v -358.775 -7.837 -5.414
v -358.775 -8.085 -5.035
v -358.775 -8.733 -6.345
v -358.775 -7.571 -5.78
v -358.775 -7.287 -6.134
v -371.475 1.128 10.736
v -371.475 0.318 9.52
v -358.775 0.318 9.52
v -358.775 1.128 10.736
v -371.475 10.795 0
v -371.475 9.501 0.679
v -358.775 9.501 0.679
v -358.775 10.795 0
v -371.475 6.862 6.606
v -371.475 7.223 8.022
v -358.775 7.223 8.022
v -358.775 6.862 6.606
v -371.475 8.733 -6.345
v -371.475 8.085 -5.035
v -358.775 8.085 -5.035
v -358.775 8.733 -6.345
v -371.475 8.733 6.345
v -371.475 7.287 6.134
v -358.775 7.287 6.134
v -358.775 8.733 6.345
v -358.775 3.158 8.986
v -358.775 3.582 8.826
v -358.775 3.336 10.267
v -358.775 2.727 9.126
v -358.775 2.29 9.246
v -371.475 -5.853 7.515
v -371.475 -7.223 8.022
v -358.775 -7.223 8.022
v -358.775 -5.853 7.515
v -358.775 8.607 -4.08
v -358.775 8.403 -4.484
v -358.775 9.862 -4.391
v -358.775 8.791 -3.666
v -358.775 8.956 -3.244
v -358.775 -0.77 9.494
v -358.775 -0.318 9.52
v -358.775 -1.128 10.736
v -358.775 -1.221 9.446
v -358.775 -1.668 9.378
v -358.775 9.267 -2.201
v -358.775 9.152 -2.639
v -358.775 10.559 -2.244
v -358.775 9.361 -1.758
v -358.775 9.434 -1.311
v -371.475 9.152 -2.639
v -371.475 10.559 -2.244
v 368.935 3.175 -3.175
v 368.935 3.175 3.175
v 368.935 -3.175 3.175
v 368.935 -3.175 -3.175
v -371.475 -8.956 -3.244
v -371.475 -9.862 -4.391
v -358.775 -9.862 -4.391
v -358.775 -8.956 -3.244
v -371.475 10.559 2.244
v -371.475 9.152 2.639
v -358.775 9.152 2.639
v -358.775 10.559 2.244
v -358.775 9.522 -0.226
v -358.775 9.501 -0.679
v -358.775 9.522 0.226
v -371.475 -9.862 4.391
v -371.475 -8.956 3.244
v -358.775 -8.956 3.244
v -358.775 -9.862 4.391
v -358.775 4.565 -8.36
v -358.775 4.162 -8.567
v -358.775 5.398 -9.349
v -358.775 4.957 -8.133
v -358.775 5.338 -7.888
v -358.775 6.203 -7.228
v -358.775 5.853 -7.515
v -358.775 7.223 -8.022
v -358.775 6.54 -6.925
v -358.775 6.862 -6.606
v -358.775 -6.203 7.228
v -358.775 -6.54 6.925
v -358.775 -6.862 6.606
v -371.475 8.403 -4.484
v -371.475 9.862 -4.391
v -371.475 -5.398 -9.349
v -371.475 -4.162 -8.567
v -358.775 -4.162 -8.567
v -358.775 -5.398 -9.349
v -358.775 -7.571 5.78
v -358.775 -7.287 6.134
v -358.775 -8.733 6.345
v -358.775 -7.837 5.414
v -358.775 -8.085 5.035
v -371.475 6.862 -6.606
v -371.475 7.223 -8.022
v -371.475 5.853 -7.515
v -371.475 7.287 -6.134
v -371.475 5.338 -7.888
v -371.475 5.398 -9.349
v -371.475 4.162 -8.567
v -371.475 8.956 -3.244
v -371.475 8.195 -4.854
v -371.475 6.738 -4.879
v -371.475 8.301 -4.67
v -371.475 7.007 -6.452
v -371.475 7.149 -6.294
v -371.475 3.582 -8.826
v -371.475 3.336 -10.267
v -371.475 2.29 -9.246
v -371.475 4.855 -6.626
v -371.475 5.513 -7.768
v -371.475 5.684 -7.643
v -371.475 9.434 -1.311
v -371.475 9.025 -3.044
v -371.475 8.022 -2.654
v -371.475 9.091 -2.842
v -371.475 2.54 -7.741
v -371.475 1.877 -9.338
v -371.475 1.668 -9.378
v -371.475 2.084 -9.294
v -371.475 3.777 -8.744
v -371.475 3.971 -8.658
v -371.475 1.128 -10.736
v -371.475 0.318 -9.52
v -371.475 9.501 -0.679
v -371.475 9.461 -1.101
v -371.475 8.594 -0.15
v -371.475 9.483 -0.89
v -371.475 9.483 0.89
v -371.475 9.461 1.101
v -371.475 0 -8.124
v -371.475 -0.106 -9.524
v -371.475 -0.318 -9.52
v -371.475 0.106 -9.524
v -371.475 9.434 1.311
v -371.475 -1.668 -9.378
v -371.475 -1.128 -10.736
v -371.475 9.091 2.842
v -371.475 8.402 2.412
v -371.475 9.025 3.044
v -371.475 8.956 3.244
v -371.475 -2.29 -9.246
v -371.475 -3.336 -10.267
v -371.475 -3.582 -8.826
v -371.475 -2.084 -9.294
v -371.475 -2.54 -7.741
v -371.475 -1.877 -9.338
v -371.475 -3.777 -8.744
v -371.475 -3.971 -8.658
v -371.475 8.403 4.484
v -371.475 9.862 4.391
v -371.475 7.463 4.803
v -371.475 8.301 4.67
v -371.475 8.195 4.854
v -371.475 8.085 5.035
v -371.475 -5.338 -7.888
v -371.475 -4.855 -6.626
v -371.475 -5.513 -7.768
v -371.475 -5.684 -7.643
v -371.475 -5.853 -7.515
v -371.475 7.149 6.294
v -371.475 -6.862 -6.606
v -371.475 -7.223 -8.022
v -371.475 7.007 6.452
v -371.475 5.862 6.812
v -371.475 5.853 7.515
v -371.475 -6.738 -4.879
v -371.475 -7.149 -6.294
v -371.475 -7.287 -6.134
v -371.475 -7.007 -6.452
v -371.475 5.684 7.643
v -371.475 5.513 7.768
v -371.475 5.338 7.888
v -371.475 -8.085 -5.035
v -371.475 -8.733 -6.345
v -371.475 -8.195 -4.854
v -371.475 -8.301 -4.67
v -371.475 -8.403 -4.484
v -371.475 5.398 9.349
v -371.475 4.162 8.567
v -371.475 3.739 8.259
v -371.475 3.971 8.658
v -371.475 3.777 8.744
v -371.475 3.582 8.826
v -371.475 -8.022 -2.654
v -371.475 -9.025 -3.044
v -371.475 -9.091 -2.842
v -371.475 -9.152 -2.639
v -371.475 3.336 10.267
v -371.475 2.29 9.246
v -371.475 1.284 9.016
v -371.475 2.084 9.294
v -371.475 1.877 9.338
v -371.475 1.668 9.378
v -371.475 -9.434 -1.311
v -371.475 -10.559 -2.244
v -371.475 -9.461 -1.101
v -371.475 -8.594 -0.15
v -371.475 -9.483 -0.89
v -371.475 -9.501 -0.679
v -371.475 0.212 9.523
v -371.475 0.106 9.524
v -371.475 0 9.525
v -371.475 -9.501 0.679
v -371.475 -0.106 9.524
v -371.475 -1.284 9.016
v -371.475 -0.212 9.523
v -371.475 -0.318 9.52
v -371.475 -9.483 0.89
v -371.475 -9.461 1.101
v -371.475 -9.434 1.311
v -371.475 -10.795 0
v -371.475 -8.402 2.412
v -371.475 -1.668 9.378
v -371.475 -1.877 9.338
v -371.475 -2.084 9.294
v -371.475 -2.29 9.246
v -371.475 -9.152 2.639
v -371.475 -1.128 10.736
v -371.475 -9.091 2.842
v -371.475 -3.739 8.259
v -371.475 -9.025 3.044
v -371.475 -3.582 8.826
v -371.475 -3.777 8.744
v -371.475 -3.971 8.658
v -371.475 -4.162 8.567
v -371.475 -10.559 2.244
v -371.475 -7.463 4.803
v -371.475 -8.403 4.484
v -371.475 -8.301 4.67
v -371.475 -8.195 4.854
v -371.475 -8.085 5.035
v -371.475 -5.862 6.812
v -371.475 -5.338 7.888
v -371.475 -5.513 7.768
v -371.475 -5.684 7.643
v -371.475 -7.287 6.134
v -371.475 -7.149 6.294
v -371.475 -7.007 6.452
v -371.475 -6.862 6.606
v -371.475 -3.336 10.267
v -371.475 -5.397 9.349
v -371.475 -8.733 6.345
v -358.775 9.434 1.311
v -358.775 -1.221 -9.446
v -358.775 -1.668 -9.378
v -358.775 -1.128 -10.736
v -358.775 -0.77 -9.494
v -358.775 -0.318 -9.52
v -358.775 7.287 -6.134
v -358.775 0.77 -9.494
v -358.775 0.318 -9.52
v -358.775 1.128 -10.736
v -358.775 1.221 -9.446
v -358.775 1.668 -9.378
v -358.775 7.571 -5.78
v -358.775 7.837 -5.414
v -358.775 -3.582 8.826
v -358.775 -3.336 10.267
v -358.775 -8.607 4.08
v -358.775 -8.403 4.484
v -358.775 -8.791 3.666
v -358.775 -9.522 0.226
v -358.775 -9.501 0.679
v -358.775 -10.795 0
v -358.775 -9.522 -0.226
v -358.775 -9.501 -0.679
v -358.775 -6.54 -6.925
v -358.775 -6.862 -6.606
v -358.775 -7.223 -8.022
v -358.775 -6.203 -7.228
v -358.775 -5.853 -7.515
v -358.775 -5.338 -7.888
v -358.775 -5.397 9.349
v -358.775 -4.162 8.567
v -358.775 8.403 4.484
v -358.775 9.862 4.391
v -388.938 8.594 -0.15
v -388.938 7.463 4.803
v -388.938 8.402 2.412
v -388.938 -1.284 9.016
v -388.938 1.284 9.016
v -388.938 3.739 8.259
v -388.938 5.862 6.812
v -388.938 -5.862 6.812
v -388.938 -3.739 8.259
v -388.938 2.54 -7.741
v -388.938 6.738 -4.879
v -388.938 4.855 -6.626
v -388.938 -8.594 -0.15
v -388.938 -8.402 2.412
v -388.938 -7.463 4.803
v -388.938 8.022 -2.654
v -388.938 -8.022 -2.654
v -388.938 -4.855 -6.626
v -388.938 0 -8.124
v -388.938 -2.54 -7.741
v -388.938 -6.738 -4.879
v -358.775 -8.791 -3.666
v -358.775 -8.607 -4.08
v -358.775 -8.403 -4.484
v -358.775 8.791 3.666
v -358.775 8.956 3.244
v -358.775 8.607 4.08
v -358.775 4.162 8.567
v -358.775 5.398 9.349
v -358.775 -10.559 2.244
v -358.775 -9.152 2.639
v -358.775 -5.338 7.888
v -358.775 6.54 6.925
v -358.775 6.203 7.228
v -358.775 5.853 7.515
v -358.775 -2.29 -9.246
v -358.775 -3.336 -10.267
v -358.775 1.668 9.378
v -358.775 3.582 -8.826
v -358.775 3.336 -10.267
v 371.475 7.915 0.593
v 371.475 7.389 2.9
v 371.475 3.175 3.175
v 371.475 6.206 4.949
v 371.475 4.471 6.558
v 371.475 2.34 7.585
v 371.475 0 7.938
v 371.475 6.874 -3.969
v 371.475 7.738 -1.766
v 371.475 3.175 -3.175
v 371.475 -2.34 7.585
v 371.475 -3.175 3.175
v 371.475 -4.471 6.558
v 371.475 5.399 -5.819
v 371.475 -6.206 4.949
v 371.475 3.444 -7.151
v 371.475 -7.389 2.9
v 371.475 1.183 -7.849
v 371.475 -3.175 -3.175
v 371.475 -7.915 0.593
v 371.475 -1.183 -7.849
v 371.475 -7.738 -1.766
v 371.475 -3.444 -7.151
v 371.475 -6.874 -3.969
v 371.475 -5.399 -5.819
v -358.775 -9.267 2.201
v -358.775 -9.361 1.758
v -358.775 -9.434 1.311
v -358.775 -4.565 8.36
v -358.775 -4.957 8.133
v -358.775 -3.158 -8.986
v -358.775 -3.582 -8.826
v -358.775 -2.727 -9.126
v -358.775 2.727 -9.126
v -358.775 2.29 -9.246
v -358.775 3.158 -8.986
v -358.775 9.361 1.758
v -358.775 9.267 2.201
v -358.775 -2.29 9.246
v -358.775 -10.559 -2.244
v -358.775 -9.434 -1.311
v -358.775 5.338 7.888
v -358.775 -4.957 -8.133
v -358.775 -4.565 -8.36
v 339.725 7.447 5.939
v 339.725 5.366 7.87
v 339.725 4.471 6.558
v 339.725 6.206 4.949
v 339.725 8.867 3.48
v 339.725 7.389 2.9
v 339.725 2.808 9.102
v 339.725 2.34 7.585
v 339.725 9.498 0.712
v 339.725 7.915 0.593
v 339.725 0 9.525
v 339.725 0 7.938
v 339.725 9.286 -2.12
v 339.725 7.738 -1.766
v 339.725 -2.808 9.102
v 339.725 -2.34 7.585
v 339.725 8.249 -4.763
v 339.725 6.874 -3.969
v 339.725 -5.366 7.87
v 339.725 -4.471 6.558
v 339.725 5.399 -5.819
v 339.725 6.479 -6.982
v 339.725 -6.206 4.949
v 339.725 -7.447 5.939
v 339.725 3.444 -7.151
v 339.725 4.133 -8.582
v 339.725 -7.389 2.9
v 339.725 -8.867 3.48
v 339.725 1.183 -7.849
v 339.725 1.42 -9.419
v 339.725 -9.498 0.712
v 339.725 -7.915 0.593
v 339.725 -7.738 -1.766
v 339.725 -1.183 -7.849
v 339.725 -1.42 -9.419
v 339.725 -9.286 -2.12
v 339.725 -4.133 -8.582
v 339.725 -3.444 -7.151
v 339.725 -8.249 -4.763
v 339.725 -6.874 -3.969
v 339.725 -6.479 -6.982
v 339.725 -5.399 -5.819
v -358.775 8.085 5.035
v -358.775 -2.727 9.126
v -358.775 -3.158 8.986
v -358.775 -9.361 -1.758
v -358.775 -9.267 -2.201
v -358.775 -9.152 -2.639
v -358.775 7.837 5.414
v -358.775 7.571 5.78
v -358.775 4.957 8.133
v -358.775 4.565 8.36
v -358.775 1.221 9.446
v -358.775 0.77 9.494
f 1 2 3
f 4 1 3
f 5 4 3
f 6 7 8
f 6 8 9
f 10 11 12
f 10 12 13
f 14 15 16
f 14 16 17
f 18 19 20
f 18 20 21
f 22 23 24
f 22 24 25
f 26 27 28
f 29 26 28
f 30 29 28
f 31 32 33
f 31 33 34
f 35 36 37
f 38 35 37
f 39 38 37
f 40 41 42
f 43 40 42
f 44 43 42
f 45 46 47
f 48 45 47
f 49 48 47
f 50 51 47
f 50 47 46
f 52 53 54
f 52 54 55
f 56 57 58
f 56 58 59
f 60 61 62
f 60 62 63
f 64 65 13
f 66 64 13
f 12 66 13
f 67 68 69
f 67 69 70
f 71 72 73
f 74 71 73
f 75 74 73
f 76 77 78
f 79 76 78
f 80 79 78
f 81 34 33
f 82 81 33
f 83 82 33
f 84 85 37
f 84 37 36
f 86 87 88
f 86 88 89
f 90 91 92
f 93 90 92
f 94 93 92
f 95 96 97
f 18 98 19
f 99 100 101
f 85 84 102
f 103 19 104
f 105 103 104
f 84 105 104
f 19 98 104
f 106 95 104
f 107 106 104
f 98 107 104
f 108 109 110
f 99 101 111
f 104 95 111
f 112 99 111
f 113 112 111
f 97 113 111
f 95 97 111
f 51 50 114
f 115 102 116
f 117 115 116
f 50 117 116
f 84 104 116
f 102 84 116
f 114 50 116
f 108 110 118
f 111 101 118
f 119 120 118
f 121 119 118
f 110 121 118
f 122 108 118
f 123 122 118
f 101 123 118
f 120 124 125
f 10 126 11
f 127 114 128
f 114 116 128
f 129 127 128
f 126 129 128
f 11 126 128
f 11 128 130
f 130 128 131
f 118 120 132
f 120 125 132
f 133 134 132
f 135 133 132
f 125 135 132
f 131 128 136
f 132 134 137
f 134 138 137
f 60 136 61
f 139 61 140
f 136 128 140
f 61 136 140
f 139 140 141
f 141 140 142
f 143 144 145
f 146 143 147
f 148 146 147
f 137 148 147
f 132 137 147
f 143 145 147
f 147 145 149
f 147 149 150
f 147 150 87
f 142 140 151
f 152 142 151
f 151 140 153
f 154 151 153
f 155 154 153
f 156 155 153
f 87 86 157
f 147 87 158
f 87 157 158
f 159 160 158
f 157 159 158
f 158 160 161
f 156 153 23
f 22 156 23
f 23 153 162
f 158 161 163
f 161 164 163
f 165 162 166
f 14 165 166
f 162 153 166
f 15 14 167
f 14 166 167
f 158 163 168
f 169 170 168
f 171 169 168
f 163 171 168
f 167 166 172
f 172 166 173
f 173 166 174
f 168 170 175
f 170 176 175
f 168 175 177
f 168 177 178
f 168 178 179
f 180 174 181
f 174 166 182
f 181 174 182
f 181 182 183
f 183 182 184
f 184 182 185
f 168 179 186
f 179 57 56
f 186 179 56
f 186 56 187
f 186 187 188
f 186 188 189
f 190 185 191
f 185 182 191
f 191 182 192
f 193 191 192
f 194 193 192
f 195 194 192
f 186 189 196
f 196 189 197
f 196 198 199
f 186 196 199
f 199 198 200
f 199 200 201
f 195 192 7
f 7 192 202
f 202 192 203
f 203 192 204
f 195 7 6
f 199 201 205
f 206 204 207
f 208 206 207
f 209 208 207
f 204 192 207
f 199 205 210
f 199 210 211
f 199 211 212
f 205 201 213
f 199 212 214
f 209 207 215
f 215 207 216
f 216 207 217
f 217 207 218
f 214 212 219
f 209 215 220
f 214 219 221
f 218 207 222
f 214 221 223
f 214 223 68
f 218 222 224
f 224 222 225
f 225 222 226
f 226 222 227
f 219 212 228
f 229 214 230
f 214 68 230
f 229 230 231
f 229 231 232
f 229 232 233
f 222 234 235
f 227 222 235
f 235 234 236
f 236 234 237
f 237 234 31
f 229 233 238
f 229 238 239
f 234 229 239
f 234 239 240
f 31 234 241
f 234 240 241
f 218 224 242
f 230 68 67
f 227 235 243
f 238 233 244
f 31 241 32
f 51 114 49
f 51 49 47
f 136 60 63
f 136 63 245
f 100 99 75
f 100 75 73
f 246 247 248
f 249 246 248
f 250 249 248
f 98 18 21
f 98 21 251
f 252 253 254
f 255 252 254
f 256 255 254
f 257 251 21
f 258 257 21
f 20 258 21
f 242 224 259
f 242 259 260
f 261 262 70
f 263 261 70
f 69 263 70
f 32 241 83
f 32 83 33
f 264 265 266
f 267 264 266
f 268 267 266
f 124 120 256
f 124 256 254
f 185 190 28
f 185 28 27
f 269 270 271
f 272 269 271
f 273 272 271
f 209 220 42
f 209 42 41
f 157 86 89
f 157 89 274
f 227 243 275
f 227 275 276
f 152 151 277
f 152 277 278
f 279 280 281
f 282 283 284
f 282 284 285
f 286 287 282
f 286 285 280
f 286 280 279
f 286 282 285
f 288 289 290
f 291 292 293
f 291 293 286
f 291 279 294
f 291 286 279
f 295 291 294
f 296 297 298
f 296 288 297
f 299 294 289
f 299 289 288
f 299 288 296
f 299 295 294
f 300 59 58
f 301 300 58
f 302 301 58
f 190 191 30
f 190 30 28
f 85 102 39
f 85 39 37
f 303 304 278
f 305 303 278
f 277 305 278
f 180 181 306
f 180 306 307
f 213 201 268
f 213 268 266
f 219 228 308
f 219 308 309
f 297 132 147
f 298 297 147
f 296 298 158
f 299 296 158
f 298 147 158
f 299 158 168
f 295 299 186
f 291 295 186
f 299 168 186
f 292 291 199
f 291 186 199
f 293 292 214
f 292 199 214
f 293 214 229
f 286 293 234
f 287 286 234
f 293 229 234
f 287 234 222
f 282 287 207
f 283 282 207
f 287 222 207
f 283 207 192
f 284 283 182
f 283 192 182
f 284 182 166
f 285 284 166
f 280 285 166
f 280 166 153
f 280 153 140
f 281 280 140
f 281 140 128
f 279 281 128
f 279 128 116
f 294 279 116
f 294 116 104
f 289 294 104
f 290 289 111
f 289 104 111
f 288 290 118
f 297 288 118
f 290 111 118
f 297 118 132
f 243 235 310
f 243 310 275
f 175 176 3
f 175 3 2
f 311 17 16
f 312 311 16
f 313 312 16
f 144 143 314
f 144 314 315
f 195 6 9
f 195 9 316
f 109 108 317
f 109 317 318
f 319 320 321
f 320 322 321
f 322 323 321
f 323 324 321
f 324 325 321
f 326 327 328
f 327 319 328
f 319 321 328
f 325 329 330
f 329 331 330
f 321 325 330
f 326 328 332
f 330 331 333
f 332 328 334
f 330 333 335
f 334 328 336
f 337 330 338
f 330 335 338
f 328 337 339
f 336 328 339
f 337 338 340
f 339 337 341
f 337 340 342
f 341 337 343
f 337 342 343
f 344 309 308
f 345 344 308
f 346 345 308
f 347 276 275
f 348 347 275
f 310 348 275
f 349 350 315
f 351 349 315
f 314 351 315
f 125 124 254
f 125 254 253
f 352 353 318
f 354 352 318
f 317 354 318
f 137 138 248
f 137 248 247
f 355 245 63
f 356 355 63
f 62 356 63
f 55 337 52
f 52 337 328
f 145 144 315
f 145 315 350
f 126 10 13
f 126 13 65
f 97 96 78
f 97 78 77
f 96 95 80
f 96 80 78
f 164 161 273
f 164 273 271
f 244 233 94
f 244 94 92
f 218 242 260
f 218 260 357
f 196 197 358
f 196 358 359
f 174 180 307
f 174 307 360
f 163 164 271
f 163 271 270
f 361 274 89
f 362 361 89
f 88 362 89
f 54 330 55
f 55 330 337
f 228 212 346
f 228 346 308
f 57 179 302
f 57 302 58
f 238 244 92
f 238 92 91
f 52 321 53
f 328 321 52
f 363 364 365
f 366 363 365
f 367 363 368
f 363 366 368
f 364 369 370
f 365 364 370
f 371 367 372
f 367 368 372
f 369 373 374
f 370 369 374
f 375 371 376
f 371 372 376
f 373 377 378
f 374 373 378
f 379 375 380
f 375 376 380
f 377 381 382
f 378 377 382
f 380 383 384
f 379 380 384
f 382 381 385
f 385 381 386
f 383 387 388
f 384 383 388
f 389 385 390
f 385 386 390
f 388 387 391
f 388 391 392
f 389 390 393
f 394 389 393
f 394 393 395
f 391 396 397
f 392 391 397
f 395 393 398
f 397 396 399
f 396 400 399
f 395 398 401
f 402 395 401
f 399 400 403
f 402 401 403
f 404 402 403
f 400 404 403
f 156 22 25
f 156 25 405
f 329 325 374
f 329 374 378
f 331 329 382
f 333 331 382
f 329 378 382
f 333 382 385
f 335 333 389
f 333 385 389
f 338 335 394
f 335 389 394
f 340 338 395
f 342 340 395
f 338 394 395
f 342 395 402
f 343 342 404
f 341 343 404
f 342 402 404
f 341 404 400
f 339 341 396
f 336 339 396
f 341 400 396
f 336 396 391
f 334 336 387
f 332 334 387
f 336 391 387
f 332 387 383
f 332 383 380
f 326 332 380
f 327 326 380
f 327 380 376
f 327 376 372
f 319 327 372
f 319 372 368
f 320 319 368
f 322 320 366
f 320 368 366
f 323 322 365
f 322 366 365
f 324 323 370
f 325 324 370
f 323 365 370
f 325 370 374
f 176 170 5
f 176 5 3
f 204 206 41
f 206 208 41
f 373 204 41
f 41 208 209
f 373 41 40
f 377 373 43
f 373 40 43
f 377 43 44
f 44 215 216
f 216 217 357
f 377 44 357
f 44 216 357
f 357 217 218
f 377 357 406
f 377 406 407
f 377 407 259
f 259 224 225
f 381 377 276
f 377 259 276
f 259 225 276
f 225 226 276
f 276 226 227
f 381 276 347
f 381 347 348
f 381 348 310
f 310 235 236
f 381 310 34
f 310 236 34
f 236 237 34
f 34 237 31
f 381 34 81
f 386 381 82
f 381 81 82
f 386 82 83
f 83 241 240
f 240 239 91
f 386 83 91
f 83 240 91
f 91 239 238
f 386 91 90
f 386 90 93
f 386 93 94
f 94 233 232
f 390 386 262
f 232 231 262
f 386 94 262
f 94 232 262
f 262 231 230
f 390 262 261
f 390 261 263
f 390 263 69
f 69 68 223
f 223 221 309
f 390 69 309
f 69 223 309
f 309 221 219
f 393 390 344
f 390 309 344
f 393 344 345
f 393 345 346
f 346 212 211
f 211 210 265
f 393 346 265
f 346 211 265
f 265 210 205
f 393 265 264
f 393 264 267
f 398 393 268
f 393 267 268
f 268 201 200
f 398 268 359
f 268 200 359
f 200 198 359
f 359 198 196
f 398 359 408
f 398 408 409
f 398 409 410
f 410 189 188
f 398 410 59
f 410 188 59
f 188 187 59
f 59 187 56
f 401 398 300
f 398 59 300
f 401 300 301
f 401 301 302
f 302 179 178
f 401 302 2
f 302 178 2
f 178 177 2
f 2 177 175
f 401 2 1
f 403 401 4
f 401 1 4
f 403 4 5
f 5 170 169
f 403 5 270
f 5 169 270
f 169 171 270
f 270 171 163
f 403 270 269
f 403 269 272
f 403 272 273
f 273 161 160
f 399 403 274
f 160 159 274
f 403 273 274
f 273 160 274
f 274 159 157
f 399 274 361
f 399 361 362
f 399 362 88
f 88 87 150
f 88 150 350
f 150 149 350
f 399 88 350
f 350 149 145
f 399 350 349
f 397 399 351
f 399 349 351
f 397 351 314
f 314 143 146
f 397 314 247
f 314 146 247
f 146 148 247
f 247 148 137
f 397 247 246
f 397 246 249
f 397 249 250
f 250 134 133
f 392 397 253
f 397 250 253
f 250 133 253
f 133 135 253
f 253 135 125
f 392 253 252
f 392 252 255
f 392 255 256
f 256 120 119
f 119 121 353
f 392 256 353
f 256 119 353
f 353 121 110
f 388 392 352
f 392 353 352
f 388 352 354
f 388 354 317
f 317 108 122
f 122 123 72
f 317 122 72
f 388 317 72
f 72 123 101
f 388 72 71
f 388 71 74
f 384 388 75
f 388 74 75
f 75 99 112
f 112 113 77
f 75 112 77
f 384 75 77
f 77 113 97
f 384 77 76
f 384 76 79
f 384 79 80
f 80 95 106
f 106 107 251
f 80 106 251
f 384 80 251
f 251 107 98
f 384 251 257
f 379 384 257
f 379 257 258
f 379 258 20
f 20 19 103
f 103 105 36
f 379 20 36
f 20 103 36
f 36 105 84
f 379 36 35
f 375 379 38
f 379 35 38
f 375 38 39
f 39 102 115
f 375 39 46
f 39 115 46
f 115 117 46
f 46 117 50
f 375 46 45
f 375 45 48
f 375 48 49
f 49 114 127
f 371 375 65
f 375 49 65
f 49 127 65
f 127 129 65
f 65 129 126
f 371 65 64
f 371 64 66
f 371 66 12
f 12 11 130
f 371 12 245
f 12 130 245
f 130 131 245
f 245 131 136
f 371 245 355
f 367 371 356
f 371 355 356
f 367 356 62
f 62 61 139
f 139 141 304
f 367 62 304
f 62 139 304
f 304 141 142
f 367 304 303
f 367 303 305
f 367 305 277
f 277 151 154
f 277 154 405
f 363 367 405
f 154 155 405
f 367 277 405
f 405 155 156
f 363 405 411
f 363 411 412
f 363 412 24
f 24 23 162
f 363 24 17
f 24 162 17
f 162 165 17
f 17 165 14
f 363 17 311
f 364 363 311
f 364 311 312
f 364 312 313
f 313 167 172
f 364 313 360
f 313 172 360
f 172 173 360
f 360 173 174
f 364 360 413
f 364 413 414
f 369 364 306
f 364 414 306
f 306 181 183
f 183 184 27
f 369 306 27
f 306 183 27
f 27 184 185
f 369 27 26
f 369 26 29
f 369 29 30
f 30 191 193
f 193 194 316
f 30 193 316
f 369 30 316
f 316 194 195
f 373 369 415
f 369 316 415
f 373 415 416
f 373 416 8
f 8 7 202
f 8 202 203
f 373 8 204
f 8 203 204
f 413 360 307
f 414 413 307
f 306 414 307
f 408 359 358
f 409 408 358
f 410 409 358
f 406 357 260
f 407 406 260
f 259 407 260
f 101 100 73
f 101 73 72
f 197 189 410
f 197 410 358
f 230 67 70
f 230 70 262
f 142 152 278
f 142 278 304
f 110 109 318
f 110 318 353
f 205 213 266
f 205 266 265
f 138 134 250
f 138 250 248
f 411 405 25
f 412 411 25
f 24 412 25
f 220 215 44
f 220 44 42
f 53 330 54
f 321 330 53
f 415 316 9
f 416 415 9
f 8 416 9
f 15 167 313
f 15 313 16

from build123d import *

# Parameters (mm, degrees)
BOSS_EXTRUDE1_DEPTH = 12.7
CIRPATTERN1_COUNT   = 30
SKETCH3_R           = 8.618103117
BOSS_EXTRUDE2_DEPTH = 17.4625
SKETCH4_W           = 6.35
SKETCH4_H           = 6.35
MAGIC_BOX_DEPTH     = 2.54


with BuildPart() as part:
    # Sketch1 → Revolve1 (revolve)
    with BuildSketch(Plane.XY):
        Polygon((-371.475, 0), (371.475, 0), (371.475, 7.9375), (339.725, 7.9375), (339.725, 9.525), (-371.475, 9.525), align=None)
    revolve(axis=Axis((-389.812509547, 0, 0), (1, 0, 0)))

    # Sketch2 → Boss-Extrude1 (add)
    with BuildSketch(Plane.ZY.offset(371.475)):
        with BuildLine():
            Line((0, 10.795), (-0.678872241, 9.500776678))
            ThreePointArc((-0.678872241, 9.500776678), (0, 9.525), (0.678872241, 9.500776678))
            Line((0.678872241, 9.500776678), (0, 10.795))
        make_face()
    boss_extrude1 = extrude(amount=-BOSS_EXTRUDE1_DEPTH)

    # CirPattern1: Boss-Extrude1 ×30 about axis
    cirpattern1_axis = Axis((-371.475, 0, 0), (-1, 0, 0))
    for i in range(1, CIRPATTERN1_COUNT):
        add(boss_extrude1.rotate(cirpattern1_axis, i * 360 / CIRPATTERN1_COUNT))

    # Sketch3 → Boss-Extrude2 (add)
    with BuildSketch(Plane.ZY.offset(371.475)):
        with Locations((0.494197933, 0)):
            Circle(SKETCH3_R)
    extrude(amount=BOSS_EXTRUDE2_DEPTH)

    # Sketch4 → Magic Box (cut)
    with BuildSketch(Plane(origin=(371.475, 0, 0), x_dir=(0, 0, -1), z_dir=(1, 0, 0))):
        Rectangle(SKETCH4_W, SKETCH4_H)
    extrude(amount=-MAGIC_BOX_DEPTH, mode=Mode.SUBTRACT)


solid = part.part
